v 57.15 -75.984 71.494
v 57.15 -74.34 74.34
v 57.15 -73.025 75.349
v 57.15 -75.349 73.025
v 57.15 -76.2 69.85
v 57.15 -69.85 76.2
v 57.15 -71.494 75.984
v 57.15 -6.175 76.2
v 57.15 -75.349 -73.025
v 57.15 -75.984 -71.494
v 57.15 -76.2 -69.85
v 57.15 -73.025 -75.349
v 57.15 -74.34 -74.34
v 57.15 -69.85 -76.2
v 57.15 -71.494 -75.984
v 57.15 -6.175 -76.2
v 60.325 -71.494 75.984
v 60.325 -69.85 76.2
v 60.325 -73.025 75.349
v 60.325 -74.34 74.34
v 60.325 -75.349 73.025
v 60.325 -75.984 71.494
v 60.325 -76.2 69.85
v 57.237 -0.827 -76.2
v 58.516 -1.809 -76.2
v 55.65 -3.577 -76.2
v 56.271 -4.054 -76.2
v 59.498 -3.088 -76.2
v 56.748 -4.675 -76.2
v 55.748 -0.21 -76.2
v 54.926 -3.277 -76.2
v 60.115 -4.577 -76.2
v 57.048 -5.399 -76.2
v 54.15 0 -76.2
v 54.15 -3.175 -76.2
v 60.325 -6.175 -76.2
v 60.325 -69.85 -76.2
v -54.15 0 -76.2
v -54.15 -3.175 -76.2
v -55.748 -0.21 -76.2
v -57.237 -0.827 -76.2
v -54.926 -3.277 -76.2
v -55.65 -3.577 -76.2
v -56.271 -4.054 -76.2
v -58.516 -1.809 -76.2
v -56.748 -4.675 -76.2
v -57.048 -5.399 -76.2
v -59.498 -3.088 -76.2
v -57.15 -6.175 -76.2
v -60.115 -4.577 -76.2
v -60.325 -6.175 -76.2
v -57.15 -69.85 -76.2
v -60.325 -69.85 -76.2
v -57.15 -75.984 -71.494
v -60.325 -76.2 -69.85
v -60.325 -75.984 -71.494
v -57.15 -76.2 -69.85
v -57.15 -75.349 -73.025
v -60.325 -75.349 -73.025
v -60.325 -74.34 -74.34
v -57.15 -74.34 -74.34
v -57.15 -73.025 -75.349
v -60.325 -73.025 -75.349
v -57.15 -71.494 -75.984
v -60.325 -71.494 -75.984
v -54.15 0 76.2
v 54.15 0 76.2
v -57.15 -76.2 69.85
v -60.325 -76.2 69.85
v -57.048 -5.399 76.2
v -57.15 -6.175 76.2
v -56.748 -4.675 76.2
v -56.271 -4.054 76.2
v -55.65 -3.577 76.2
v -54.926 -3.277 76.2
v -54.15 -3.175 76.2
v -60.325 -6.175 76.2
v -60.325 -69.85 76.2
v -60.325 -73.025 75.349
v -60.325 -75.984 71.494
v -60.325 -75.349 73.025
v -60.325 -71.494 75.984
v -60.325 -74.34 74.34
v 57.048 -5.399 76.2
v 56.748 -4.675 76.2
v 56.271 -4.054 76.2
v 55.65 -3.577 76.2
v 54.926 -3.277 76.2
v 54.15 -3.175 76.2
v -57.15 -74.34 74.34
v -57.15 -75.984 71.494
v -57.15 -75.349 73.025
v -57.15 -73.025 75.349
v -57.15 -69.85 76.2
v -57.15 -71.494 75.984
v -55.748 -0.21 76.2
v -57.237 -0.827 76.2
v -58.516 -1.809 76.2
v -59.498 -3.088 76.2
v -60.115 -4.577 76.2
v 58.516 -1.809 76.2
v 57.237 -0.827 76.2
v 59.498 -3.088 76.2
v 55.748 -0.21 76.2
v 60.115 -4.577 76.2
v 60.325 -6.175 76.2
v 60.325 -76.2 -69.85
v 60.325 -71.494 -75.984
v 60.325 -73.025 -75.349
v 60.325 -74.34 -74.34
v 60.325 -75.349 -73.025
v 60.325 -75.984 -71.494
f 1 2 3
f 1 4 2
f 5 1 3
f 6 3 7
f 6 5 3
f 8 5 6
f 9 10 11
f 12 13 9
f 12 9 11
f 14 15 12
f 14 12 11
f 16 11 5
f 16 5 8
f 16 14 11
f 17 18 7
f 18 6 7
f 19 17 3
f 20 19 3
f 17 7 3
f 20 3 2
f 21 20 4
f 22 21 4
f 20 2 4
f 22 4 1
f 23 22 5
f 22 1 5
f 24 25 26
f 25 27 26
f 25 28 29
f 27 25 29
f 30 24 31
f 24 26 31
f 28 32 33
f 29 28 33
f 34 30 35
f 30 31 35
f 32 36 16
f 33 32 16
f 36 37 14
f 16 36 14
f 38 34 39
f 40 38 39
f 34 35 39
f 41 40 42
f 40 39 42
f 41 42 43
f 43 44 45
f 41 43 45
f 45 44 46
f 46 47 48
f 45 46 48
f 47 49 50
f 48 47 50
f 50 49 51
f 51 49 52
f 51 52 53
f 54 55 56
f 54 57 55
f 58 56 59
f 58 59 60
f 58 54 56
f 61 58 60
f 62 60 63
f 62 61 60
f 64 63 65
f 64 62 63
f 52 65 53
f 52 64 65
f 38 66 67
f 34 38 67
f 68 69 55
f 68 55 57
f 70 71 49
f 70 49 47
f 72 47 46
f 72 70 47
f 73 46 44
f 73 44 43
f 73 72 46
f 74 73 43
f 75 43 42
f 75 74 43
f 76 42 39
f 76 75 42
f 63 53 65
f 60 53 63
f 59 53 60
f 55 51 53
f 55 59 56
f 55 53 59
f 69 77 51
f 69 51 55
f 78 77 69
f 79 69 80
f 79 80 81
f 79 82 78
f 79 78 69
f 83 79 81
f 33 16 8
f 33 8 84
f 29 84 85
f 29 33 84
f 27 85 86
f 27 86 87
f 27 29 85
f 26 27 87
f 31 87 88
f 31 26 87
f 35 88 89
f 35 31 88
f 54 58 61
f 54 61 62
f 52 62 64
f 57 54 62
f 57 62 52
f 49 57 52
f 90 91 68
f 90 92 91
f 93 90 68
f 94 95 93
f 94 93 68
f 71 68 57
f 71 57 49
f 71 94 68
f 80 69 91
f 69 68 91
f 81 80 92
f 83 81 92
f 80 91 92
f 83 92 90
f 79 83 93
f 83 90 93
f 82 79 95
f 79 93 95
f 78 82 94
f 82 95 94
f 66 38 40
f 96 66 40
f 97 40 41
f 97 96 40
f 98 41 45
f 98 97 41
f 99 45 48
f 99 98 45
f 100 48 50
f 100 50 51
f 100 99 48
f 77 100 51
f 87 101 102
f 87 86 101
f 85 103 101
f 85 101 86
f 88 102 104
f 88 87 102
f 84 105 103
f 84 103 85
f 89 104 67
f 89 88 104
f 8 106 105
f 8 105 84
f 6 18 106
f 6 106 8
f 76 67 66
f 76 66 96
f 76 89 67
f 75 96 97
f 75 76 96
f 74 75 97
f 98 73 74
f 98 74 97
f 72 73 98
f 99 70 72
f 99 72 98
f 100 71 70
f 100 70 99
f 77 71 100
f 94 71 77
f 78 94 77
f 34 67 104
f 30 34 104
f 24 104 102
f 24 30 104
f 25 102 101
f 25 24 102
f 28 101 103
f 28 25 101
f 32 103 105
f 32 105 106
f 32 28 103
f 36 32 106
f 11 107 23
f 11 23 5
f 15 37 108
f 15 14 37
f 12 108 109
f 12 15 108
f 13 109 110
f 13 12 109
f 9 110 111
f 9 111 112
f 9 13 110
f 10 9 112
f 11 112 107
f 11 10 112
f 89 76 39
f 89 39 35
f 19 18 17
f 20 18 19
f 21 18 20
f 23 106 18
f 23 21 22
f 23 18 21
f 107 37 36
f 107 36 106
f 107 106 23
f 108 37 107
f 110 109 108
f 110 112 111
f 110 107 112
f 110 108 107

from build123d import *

# Parameters (mm, degrees)
SKETCH1_W                      = 114.3
SKETCH1_H                      = 152.4
BASE_FLANGE1_DEPTH             = 3.175
EDGE_FLANGE1_STRIP_W           = 18.700000192
EDGE_FLANGE1_STRIP_H           = 3.175
EDGE_FLANGE1_STRIP_CUT_DEPTH   = 152.4
EDGE_FLANGE1_STRIP_2_W         = 18.700000192
EDGE_FLANGE1_STRIP_2_H         = 3.175
EDGE_FLANGE1_STRIP_CUT_2_DEPTH = 152.4
EDGE_FLANGE1_DEPTH             = 152.4
EDGE_FLANGE1_BEND_DEPTH        = 152.4
FILLET1_R                      = 6.35


# Sheet-metal steps are written as plain solids
with BuildPart() as part:
    # Sketch1 → Base-Flange1 (new body)
    with BuildSketch(Plane(origin=(0, 0, 0), x_dir=(1, 0, 0), z_dir=(0, 1, 0))):
        Rectangle(SKETCH1_W, SKETCH1_H)
    extrude(amount=-BASE_FLANGE1_DEPTH)

    # Edge-Flange1 strip (across the edge) → Edge-Flange1 strip cut (cut)
    with BuildSketch(Plane(origin=(57.15, -3.175, -76.2), x_dir=(-1, 0, 0), z_dir=(0, 0, 1))):
        with Locations((-6.35, -1.5875)):
            Rectangle(EDGE_FLANGE1_STRIP_W, EDGE_FLANGE1_STRIP_H)
    extrude(amount=EDGE_FLANGE1_STRIP_CUT_DEPTH, mode=Mode.SUBTRACT)

    # Edge-Flange1 strip 2 (across the edge) → Edge-Flange1 strip cut 2 (cut)
    with BuildSketch(Plane(origin=(-57.15, -3.175, 76.2), x_dir=(1, 0, 0), z_dir=(0, 0, -1))):
        with Locations((-6.35, -1.5875)):
            Rectangle(EDGE_FLANGE1_STRIP_2_W, EDGE_FLANGE1_STRIP_2_H)
    extrude(amount=EDGE_FLANGE1_STRIP_CUT_2_DEPTH, mode=Mode.SUBTRACT)

    # Edge-Flange1 section (across the edge) → Edge-Flange1 (add)
    with BuildSketch(Plane(origin=(57.15, -3.175, -76.2), x_dir=(-1, 0, 0), z_dir=(0, 0, 1))):
        with BuildLine():
            Line((-3.175, 3.000000096), (-3.175, 73.025))
            Line((-3.175, 73.025), (0, 73.025))
            Line((0, 73.025), (0, 3.000000096))
            ThreePointArc((0, 3.000000096), (0.878679685, 0.878679685), (3.000000096, 0))
            Line((3.000000096, 0), (3.000000096, -3.175))
            ThreePointArc((3.000000096, -3.175), (-1.366384346, -1.366384346), (-3.175, 3.000000096))
        make_face()
    extrude(amount=EDGE_FLANGE1_DEPTH)

    # Edge-Flange1 section 2 (across the edge) → Edge-Flange1 bend (add)
    with BuildSketch(Plane(origin=(-57.15, -3.175, 76.2), x_dir=(1, 0, 0), z_dir=(0, 0, -1))):
        with BuildLine():
            Line((-3.175, 3.000000096), (-3.175, 73.025))
            Line((-3.175, 73.025), (0, 73.025))
            Line((0, 73.025), (0, 3.000000096))
            ThreePointArc((0, 3.000000096), (0.878679685, 0.878679685), (3.000000096, 0))
            Line((3.000000096, 0), (3.000000096, -3.175))
            ThreePointArc((3.000000096, -3.175), (-1.366384346, -1.366384346), (-3.175, 3.000000096))
        make_face()
    extrude(amount=EDGE_FLANGE1_BEND_DEPTH)

    # Fillet1
    fillet1_edges = [part.edges().sort_by_distance(p)[0] for p in [
        (58.7375, -76.2, -76.2),
        (58.7375, -76.2, 76.2),
        (-58.7375, -76.2, 76.2),
        (-58.7375, -76.2, -76.2),
    ]]
    fillet(fillet1_edges, radius=FILLET1_R)


solid = part.part
